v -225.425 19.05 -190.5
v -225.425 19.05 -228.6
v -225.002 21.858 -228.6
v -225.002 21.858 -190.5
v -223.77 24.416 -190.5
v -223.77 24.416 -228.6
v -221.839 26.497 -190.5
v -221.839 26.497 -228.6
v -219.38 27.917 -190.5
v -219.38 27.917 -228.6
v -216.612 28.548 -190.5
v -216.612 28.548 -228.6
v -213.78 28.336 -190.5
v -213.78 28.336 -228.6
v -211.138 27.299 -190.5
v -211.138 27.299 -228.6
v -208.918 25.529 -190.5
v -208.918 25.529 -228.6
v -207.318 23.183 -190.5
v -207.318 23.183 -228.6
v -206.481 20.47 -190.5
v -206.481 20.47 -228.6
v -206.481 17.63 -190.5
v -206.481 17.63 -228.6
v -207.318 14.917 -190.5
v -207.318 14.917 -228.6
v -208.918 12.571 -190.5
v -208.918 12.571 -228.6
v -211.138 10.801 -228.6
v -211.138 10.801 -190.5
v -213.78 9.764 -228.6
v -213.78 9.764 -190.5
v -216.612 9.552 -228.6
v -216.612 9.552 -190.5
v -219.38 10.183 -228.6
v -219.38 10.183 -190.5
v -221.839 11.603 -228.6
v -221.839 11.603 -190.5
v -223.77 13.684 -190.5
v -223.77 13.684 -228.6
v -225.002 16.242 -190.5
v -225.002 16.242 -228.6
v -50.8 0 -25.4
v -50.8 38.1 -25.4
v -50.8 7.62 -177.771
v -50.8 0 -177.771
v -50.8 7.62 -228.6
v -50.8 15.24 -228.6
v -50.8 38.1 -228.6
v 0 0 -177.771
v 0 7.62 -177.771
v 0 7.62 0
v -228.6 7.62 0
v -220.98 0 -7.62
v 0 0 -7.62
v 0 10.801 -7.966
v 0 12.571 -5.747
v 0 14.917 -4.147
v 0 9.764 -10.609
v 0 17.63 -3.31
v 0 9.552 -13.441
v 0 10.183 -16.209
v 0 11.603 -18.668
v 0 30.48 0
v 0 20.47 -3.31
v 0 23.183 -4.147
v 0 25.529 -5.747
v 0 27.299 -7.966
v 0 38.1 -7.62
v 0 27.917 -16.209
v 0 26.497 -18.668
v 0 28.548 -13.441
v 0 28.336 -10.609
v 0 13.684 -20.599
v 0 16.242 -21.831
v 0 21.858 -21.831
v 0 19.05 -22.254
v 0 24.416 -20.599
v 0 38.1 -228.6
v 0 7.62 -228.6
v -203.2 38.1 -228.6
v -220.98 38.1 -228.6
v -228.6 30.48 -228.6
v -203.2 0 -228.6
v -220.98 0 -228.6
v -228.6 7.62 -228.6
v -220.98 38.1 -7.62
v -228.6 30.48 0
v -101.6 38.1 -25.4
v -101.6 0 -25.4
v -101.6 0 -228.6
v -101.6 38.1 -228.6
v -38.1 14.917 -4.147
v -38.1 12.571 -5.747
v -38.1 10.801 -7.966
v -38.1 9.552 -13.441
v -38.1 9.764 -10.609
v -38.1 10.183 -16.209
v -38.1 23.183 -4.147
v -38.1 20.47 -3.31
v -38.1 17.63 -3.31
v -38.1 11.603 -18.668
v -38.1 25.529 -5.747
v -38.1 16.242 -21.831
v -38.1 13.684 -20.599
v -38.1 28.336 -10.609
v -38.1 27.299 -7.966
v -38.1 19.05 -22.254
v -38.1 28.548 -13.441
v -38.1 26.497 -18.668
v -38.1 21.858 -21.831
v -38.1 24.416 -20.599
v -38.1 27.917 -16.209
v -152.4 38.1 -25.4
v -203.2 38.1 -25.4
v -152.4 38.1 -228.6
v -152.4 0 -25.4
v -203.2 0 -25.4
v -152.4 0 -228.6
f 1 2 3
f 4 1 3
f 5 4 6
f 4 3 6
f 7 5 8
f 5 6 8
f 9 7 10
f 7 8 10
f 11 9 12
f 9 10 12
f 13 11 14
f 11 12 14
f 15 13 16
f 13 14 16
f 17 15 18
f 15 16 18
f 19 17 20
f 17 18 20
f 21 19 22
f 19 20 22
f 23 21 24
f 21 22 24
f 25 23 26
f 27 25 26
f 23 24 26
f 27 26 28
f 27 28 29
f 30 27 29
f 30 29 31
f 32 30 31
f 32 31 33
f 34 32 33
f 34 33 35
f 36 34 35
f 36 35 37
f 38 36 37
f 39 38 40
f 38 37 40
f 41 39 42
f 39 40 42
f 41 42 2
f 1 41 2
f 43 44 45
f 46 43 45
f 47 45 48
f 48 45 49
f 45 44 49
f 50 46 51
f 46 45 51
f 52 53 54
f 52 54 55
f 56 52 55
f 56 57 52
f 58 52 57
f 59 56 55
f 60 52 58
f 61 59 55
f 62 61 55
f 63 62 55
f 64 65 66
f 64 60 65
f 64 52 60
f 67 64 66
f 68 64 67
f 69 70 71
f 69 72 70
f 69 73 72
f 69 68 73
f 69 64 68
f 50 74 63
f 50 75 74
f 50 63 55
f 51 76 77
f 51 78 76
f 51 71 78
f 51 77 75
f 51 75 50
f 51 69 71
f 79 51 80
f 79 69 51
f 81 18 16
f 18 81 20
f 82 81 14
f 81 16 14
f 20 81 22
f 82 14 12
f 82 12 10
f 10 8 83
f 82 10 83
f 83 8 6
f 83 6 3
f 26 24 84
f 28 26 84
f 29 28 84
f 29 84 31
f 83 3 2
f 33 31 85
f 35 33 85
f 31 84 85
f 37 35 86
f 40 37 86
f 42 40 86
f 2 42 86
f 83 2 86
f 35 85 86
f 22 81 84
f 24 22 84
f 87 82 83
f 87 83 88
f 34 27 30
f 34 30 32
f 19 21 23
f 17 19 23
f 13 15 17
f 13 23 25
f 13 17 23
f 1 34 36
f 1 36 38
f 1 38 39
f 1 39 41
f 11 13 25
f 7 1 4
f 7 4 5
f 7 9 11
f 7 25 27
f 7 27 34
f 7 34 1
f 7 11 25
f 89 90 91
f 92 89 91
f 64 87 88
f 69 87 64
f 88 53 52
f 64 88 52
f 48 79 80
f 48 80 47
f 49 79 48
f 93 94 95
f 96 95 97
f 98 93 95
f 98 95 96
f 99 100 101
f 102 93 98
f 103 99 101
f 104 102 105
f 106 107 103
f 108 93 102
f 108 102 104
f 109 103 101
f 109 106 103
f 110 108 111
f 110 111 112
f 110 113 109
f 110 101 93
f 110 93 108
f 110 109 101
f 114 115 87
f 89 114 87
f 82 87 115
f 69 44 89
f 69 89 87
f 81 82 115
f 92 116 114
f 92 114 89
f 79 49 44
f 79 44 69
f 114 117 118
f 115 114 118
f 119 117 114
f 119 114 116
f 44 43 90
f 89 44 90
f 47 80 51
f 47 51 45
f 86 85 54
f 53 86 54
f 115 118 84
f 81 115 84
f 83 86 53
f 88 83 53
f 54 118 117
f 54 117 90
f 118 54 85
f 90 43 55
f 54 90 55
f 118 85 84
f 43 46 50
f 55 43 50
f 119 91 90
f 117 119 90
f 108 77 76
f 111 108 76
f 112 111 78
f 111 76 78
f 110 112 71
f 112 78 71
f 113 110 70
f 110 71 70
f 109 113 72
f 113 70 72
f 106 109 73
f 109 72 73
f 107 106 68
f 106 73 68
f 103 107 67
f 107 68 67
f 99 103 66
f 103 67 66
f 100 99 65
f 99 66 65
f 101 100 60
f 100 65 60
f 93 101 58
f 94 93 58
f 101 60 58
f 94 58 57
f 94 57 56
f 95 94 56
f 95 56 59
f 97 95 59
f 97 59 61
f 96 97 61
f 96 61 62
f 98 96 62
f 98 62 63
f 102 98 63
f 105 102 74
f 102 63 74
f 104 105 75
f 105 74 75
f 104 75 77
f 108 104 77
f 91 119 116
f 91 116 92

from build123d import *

# Parameters (mm, degrees)
SKETCH1_W           = 50.8
SKETCH1_H           = 203.2
BOSS_EXTRUDE2_DEPTH = 38.1
SKETCH2_R           = 9.525
CUT_EXTRUDE1_DEPTH  = 38.1
SKETCH3_R           = 9.525
CUT_EXTRUDE2_DEPTH  = 38.1
SKETCH4_W           = 253.975113334
SKETCH4_H           = 254.028971003
CUT_EXTRUDE3_DEPTH  = 7.62
SKETCH5_W           = 254
SKETCH5_H           = 254.028971003
CUT_EXTRUDE4_DEPTH  = 60.96
SKETCH6_W           = 50.8
SKETCH6_H           = 50.828971003
BOSS_EXTRUDE3_DEPTH = 7.62
CHAMFER1_SIZE       = 7.62


with BuildPart() as part:
    # Sketch1 → Boss-Extrude2 (new body)
    with BuildSketch(Plane(origin=(0, 0, 0), x_dir=(1, 0, 0), z_dir=(0, 1, 0))):
        Polygon((0, 0), (0, 25.4), (-50.8, 25.4), (-101.6, 25.4), (-152.4, 25.4), (-203.2, 25.4), (-203.2, 228.6), (-228.6, 228.6), (-228.6, 0), align=None)
        with Locations((-127, 127)):
            Rectangle(SKETCH1_W, SKETCH1_H)
        with Locations((-25.4, 127)):
            Rectangle(SKETCH1_W, SKETCH1_H)
    extrude(amount=BOSS_EXTRUDE2_DEPTH)

    # Sketch2 → Cut-Extrude1 (cut)
    with BuildSketch(Plane(origin=(0, 0, -228.6), x_dir=(-1, 0, 0), z_dir=(0, 0, -1))):
        with Locations((215.9, 19.05)):
            Circle(SKETCH2_R)
    extrude(amount=-CUT_EXTRUDE1_DEPTH, mode=Mode.SUBTRACT)

    # Sketch3 → Cut-Extrude2 (cut)
    with BuildSketch(Plane(origin=(0, 0, 0), x_dir=(0, 0, -1), z_dir=(1, 0, 0))):
        with Locations((12.728971003, 19.05)):
            Circle(SKETCH3_R)
    extrude(amount=-CUT_EXTRUDE2_DEPTH, mode=Mode.SUBTRACT)

    # Sketch4 → Cut-Extrude3 (cut)
    with BuildSketch(Plane(origin=(0, 7.62, 0), x_dir=(-1, 0, 0), z_dir=(0, -1, 0))):
        with Locations((-50.812443333, 304.785514498)):
            Rectangle(SKETCH4_W, SKETCH4_H)
    extrude(amount=-CUT_EXTRUDE3_DEPTH, mode=Mode.SUBTRACT)

    # Sketch5 → Cut-Extrude4 (cut)
    with BuildSketch(Plane.XZ.offset(-7.62)):
        with Locations((50.8, -304.785514498)):
            Rectangle(SKETCH5_W, SKETCH5_H)
    extrude(amount=CUT_EXTRUDE4_DEPTH, mode=Mode.SUBTRACT)

    # Sketch6 → Boss-Extrude3 (add)
    with BuildSketch(Plane(origin=(0, 15.24, 0), x_dir=(-1, 0, 0), z_dir=(0, -1, 0))):
        with Locations((25.4, 203.185514499)):
            Rectangle(SKETCH6_W, SKETCH6_H)
    extrude(amount=BOSS_EXTRUDE3_DEPTH)

    # Chamfer1
    chamfer1_edges = [part.edges().sort_by_distance(p)[0] for p in [
        (-114.3, 0, 0),
        (-228.6, 0, -114.3),
        (-228.6, 38.1, -114.3),
        (-114.3, 38.1, 0),
    ]]
    chamfer(chamfer1_edges, length=CHAMFER1_SIZE)


solid = part.part
